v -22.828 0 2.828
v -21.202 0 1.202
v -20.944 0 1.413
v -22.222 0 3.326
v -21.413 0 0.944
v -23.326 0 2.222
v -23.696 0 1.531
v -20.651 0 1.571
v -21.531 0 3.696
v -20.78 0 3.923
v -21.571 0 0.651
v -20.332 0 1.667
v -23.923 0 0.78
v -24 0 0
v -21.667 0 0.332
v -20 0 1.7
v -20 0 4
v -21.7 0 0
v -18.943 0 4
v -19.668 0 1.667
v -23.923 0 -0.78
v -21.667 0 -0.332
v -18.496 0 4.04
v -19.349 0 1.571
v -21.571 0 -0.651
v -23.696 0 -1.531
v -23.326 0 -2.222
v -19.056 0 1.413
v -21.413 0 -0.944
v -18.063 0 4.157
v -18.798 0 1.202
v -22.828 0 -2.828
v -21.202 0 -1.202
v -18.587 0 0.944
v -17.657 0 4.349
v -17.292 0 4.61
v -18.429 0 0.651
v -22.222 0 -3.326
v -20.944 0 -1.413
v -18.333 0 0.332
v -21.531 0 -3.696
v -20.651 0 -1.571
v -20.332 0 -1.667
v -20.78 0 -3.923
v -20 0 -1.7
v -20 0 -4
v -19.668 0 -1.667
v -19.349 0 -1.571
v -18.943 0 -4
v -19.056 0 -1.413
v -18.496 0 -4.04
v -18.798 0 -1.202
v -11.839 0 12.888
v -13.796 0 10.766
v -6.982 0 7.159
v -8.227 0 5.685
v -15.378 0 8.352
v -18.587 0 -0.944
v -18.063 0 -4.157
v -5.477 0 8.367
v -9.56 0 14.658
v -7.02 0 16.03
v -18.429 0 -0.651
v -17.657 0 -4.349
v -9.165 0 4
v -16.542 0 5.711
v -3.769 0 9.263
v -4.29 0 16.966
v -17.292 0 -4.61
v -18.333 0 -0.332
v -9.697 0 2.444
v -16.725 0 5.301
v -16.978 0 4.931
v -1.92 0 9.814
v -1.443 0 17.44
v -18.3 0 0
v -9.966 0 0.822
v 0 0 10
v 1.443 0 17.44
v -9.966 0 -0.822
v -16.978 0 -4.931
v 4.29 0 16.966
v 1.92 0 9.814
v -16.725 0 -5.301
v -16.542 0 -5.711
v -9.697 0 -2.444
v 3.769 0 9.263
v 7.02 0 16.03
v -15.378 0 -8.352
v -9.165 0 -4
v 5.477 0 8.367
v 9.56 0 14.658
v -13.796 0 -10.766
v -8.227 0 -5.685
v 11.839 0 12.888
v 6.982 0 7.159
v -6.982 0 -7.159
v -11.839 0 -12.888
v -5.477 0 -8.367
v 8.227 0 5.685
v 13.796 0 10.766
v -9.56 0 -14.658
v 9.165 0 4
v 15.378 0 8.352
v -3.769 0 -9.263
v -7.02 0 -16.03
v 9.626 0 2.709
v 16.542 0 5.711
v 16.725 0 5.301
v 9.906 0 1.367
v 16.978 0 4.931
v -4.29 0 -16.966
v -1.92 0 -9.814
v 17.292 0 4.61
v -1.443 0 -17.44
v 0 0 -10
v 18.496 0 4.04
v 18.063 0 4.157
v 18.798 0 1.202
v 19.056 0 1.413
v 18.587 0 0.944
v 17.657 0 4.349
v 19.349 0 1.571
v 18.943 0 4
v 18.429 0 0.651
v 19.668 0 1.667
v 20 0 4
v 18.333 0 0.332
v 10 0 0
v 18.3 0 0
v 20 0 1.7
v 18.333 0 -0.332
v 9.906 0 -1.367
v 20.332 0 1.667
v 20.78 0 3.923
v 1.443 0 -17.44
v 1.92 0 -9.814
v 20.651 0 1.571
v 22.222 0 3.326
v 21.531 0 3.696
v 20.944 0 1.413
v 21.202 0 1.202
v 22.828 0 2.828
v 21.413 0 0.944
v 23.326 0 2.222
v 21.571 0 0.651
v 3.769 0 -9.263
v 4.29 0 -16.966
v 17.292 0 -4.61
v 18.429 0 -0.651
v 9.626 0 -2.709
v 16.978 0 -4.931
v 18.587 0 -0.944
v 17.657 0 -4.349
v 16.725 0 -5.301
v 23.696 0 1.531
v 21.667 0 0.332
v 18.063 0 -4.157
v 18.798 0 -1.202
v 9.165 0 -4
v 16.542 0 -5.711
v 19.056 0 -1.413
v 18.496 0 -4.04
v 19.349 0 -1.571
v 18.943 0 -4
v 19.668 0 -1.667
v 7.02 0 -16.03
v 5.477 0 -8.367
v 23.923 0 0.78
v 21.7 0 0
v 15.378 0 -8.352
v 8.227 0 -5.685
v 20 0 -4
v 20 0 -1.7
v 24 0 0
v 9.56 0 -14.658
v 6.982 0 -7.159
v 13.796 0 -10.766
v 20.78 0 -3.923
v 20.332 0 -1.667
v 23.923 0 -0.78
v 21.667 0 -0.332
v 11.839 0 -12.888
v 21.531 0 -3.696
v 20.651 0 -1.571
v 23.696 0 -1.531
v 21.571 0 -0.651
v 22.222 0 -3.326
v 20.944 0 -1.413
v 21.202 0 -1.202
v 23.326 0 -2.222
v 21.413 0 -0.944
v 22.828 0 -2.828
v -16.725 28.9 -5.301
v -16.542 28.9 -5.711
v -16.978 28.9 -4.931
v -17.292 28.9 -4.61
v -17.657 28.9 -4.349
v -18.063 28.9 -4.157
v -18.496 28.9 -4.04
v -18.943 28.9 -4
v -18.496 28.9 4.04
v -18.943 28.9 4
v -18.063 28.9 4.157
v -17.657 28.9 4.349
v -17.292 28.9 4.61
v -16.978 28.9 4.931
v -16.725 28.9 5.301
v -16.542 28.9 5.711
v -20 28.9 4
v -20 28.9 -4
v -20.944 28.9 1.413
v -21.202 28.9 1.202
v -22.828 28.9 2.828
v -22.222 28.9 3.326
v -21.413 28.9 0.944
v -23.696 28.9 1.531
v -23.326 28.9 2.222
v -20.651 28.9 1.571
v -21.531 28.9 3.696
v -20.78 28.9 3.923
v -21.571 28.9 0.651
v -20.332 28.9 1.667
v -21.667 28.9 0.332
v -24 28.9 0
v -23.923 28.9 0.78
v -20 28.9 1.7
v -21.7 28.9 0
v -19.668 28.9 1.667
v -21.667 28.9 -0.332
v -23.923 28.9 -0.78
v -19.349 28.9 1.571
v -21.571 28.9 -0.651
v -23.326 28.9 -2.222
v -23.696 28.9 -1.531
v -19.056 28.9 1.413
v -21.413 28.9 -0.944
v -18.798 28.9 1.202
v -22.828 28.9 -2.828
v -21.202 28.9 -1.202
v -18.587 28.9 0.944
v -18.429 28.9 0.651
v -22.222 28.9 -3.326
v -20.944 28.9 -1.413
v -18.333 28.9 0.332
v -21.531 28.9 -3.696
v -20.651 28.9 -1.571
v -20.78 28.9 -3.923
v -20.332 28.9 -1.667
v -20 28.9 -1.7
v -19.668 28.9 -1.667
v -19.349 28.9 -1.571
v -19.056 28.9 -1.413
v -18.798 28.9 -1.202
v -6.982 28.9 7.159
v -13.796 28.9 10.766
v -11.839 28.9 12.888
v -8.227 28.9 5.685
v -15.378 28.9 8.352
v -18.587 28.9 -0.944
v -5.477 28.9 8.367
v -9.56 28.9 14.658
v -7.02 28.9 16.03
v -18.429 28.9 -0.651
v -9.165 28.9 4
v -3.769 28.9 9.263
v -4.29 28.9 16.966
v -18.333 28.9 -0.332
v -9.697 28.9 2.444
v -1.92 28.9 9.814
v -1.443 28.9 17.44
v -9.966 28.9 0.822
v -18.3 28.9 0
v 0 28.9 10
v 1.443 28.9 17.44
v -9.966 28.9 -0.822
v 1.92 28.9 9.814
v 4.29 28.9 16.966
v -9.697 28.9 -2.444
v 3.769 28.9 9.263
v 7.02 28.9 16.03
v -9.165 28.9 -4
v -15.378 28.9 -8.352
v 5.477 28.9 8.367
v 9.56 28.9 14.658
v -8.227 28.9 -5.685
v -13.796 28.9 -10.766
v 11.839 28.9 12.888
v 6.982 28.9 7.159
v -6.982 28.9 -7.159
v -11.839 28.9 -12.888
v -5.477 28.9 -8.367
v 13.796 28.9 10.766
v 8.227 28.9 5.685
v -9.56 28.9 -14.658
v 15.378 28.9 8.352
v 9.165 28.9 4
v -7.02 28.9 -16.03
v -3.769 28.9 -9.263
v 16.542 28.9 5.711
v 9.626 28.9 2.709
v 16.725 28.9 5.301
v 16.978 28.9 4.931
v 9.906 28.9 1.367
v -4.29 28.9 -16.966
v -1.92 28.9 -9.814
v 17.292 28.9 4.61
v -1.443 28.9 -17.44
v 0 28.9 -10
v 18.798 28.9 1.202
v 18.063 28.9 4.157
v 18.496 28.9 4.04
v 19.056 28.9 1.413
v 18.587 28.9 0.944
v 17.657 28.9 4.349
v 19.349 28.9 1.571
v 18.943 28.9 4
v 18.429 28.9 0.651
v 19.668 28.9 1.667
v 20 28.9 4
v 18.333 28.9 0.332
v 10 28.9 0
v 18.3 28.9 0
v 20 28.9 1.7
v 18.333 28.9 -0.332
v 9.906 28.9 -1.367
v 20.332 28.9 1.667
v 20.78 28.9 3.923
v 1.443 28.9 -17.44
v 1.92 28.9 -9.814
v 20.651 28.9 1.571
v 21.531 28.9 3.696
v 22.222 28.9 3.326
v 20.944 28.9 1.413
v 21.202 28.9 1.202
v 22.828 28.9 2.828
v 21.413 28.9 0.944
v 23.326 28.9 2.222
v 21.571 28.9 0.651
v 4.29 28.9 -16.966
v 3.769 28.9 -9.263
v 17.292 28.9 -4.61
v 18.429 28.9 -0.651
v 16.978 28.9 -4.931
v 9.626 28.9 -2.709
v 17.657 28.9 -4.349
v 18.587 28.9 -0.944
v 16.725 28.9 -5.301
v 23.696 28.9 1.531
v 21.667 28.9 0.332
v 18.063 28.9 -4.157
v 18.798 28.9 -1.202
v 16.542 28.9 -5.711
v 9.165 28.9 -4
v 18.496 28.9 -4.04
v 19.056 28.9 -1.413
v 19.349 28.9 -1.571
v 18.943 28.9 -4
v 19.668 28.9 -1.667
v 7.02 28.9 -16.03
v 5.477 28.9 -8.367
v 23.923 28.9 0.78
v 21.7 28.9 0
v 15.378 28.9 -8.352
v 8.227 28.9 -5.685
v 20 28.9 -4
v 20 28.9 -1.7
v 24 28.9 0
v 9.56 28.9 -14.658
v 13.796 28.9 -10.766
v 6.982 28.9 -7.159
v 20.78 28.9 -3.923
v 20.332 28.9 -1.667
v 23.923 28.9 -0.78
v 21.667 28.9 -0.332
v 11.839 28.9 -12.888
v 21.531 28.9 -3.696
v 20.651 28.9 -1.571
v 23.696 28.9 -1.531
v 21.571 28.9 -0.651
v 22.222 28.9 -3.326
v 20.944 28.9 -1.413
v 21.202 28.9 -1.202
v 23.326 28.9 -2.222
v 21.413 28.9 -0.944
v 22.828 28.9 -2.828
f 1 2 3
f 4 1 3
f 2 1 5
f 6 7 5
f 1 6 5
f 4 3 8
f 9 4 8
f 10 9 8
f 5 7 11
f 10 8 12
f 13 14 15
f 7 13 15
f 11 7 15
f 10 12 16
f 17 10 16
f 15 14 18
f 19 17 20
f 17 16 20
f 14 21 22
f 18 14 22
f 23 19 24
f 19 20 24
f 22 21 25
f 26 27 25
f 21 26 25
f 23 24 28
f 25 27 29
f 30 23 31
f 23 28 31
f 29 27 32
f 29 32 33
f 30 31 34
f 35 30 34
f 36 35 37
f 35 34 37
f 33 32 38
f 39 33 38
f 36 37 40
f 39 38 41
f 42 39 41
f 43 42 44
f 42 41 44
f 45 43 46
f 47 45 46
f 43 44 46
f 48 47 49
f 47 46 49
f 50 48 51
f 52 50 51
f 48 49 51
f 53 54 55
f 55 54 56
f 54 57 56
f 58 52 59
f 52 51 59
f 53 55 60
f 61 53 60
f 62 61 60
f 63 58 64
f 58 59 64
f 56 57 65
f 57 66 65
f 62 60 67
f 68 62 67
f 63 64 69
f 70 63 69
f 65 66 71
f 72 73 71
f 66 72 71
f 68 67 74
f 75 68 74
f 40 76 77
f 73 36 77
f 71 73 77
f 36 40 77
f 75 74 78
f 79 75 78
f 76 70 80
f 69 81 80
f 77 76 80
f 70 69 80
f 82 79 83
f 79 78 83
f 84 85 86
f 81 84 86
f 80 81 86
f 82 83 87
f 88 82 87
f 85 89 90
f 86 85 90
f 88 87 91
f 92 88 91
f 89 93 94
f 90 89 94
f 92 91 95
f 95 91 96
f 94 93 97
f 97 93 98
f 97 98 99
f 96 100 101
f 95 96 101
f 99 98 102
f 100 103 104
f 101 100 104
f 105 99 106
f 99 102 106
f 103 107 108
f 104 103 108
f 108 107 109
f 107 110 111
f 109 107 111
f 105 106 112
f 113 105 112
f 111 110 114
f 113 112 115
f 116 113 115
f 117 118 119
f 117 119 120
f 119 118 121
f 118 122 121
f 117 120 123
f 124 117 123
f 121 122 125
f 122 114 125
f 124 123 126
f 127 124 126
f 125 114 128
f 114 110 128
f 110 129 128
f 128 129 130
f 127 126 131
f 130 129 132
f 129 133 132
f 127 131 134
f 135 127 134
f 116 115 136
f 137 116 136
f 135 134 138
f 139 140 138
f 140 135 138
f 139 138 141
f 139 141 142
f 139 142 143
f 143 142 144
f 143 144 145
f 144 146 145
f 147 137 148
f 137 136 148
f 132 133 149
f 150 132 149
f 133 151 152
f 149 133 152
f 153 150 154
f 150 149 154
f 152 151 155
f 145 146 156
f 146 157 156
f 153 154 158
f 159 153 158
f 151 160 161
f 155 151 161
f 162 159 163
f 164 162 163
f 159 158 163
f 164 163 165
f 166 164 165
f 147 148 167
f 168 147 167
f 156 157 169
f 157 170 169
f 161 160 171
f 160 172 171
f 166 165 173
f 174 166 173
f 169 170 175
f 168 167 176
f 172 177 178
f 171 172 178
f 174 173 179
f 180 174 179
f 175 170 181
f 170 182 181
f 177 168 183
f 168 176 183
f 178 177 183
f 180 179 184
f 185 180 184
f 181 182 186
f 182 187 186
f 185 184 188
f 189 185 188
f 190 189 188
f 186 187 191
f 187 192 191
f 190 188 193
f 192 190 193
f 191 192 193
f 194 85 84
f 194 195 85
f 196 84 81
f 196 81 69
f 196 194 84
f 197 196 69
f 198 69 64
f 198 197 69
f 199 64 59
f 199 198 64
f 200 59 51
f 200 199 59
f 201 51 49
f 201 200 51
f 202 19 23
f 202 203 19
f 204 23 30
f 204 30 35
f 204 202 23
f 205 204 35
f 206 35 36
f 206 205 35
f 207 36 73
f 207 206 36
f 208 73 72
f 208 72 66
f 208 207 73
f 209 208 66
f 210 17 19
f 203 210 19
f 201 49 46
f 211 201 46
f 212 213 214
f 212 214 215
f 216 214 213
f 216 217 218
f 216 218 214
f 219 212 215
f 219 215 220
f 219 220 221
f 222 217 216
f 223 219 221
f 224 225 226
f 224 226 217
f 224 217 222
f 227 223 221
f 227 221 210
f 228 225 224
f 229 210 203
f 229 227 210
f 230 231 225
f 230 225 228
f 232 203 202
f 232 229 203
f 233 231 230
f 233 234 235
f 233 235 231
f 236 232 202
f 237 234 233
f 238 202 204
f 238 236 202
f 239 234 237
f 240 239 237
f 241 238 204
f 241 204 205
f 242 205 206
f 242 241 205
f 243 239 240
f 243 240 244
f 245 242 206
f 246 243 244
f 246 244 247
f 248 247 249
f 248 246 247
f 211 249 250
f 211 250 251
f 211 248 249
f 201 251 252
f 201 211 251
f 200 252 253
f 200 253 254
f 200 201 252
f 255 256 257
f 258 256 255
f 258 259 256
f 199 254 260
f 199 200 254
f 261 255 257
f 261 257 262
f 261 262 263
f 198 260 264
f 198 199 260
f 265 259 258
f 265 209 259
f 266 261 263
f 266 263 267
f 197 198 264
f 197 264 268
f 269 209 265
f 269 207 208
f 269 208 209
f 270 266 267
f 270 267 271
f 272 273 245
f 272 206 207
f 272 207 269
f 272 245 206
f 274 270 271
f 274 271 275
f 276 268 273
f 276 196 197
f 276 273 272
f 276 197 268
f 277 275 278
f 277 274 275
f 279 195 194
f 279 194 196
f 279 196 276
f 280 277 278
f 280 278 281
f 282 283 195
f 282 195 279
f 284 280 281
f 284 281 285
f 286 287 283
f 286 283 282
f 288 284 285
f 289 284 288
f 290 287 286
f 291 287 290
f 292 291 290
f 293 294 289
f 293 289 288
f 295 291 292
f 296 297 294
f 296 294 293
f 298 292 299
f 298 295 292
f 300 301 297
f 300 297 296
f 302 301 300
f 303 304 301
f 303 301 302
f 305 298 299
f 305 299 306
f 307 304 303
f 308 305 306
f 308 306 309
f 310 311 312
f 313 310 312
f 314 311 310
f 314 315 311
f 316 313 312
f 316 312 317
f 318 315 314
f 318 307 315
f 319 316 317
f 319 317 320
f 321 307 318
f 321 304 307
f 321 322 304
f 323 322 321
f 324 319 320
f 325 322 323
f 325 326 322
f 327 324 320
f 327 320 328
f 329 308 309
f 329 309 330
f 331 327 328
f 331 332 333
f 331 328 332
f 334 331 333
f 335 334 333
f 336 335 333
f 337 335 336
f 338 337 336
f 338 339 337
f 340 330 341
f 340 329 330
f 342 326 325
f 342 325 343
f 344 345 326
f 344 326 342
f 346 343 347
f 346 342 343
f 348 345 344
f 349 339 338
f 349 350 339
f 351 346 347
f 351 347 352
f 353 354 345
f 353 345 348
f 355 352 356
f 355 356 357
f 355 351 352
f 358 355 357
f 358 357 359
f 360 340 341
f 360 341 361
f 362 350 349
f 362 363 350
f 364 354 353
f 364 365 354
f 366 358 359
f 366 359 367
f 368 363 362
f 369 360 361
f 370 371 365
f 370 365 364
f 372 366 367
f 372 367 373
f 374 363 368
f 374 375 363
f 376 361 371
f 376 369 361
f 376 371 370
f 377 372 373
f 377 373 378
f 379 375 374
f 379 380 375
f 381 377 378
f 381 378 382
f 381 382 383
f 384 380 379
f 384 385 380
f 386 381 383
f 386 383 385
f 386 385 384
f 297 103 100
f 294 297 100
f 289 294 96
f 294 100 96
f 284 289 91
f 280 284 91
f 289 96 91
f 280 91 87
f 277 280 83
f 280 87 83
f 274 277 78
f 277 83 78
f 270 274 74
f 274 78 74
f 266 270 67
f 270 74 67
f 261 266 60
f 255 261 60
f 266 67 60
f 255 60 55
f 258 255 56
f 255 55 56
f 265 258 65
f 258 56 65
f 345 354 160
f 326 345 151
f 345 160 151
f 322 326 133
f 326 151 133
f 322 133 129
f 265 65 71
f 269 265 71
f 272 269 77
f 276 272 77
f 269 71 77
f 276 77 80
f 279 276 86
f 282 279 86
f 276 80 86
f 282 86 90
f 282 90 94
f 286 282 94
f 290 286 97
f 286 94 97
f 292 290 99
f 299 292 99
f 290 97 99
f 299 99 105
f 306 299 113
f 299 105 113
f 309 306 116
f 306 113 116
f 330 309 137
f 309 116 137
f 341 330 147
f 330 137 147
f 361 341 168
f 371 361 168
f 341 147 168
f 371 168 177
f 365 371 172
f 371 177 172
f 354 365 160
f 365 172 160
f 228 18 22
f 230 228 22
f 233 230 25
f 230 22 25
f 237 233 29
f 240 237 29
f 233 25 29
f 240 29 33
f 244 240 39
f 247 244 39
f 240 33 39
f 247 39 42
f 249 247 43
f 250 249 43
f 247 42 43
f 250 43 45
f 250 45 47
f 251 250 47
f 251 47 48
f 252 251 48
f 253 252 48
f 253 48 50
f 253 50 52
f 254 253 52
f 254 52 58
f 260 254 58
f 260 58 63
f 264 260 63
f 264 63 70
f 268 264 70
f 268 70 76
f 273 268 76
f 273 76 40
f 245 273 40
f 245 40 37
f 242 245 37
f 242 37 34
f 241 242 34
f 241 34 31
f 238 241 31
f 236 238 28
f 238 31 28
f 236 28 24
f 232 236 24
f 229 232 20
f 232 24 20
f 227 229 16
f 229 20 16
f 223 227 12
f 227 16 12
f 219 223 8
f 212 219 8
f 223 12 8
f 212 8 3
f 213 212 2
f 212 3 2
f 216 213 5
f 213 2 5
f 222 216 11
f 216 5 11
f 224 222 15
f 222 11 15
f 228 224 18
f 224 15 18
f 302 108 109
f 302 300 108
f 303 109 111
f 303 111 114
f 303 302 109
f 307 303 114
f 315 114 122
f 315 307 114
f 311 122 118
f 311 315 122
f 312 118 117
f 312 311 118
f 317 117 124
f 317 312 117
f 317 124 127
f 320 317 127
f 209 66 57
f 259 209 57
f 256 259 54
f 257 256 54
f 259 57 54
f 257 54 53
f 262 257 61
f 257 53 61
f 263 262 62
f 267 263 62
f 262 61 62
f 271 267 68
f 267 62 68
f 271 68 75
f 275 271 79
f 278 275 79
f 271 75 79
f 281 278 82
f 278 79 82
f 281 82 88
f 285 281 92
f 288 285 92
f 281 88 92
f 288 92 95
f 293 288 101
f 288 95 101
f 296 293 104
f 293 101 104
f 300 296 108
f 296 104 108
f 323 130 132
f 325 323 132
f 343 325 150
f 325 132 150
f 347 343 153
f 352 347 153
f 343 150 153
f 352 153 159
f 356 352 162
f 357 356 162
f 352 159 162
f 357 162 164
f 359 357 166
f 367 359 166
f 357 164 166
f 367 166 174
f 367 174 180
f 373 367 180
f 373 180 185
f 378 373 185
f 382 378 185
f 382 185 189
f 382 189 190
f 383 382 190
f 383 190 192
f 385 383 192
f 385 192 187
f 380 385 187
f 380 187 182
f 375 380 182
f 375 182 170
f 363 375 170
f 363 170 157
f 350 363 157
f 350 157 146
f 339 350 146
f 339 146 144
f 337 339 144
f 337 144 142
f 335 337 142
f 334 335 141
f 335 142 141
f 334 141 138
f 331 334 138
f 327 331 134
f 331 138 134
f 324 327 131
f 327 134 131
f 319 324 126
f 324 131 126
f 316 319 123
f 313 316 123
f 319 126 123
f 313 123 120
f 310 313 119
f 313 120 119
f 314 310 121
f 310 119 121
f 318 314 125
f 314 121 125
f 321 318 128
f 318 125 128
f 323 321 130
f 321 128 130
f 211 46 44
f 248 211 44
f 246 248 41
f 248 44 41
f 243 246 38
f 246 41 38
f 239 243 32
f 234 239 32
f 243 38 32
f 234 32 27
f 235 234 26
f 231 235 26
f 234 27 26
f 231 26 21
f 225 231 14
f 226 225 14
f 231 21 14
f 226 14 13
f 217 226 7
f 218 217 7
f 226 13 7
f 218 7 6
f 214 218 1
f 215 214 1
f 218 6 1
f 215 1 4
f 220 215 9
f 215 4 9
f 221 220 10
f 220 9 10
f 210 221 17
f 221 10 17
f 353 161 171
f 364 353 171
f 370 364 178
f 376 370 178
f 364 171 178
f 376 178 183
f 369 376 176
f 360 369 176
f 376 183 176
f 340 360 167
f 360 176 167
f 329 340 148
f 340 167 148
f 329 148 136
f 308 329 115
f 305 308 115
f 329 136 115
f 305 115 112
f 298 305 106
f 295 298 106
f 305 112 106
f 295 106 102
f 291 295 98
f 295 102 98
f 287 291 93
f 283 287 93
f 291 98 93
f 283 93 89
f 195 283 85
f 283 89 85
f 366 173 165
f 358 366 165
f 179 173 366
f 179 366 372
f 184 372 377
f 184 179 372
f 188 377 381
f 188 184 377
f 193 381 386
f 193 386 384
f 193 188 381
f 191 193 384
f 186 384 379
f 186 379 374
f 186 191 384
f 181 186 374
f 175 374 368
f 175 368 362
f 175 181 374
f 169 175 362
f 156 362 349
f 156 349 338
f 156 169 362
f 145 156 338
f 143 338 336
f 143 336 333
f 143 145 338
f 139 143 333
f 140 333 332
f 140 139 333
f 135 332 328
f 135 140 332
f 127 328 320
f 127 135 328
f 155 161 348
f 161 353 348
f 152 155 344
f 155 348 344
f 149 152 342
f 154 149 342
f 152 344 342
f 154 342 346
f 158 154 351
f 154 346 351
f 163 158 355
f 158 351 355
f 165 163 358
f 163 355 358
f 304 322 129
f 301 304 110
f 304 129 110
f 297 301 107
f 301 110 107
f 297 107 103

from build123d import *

# Parameters (mm, degrees)
BOSS_EXTRUDE1_DEPTH  = 28.9
FILLET1_R            = 2.54
M3_CLEARANCE_HOLE1_D = 3.4


with BuildPart() as part:
    # Sketch1 → Boss-Extrude1 (new body)
    with BuildSketch(Plane(origin=(0, 0, 0), x_dir=(1, 0, 0), z_dir=(0, 1, 0))):
        with BuildLine():
            Line((9.16515139, 4), (17.036725037, 4))
            ThreePointArc((17.036725037, 4), (0, 17.5), (-17.036725037, 4))
            Line((-17.036725037, 4), (-9.16515139, 4))
            ThreePointArc((-9.16515139, 4), (0, 10), (9.16515139, 4))
        make_face()
        with BuildLine():
            Line((9.16515139, -4), (17.036725037, -4))
            ThreePointArc((17.036725037, -4), (17.383795445, -2.013369296), (17.5, 0))
            ThreePointArc((17.5, 0), (17.383795445, 2.013369296), (17.036725037, 4))
            Line((17.036725037, 4), (9.16515139, 4))
            ThreePointArc((9.16515139, 4), (9.789063129, 2.043096437), (10, 0))
            ThreePointArc((10, 0), (9.789063129, -2.043096437), (9.16515139, -4))
        make_face()
        with BuildLine():
            ThreePointArc((-17.036725037, 4), (-17.5, 0), (-17.036725037, -4))
            Line((-17.036725037, -4), (-9.16515139, -4))
            ThreePointArc((-9.16515139, -4), (-10, 0), (-9.16515139, 4))
            Line((-9.16515139, 4), (-17.036725037, 4))
        make_face()
        with BuildLine():
            ThreePointArc((-17.036725037, -4), (0, -17.5), (17.036725037, -4))
            Line((17.036725037, -4), (9.16515139, -4))
            ThreePointArc((9.16515139, -4), (0, -10), (-9.16515139, -4))
            Line((-9.16515139, -4), (-17.036725037, -4))
        make_face()
        with BuildLine():
            Line((17.036725037, -4), (20, -4))
            Line((20, -4), (20, 4))
            Line((20, 4), (17.036725037, 4))
            ThreePointArc((17.036725037, 4), (17.383795445, 2.013369296), (17.5, 0))
            ThreePointArc((17.5, 0), (17.383795445, -2.013369296), (17.036725037, -4))
        make_face()
        with BuildLine():
            ThreePointArc((20, 4), (24, 0), (20, -4))
            Line((20, -4), (20, 4))
        make_face()
        with BuildLine():
            Line((-20, -4), (-20, 4))
            ThreePointArc((-20, 4), (-24, 0), (-20, -4))
        make_face()
        with BuildLine():
            Line((-20, -4), (-17.036725037, -4))
            ThreePointArc((-17.036725037, -4), (-17.5, 0), (-17.036725037, 4))
            Line((-17.036725037, 4), (-20, 4))
            Line((-20, 4), (-20, -4))
        make_face()
    extrude(amount=BOSS_EXTRUDE1_DEPTH)

    # Fillet1
    fillet1_edges = [part.edges().sort_by_distance(p)[0] for p in [
        (-17.036725037, 14.45, 4),
        (-17.036725037, 14.45, -4),
        (17.036725037, 14.45, -4),
        (17.036725037, 14.45, 4),
    ]]
    fillet(fillet1_edges, radius=FILLET1_R)

    # M3 Clearance Hole1 (through all)
    with Locations(Plane(origin=(0, 28.9, 0), x_dir=(1, 0, 0), z_dir=(0, 1, 0))):
        with Locations((-20, 0), (20, 0)):
            Hole(M3_CLEARANCE_HOLE1_D / 2)


solid = part.part
